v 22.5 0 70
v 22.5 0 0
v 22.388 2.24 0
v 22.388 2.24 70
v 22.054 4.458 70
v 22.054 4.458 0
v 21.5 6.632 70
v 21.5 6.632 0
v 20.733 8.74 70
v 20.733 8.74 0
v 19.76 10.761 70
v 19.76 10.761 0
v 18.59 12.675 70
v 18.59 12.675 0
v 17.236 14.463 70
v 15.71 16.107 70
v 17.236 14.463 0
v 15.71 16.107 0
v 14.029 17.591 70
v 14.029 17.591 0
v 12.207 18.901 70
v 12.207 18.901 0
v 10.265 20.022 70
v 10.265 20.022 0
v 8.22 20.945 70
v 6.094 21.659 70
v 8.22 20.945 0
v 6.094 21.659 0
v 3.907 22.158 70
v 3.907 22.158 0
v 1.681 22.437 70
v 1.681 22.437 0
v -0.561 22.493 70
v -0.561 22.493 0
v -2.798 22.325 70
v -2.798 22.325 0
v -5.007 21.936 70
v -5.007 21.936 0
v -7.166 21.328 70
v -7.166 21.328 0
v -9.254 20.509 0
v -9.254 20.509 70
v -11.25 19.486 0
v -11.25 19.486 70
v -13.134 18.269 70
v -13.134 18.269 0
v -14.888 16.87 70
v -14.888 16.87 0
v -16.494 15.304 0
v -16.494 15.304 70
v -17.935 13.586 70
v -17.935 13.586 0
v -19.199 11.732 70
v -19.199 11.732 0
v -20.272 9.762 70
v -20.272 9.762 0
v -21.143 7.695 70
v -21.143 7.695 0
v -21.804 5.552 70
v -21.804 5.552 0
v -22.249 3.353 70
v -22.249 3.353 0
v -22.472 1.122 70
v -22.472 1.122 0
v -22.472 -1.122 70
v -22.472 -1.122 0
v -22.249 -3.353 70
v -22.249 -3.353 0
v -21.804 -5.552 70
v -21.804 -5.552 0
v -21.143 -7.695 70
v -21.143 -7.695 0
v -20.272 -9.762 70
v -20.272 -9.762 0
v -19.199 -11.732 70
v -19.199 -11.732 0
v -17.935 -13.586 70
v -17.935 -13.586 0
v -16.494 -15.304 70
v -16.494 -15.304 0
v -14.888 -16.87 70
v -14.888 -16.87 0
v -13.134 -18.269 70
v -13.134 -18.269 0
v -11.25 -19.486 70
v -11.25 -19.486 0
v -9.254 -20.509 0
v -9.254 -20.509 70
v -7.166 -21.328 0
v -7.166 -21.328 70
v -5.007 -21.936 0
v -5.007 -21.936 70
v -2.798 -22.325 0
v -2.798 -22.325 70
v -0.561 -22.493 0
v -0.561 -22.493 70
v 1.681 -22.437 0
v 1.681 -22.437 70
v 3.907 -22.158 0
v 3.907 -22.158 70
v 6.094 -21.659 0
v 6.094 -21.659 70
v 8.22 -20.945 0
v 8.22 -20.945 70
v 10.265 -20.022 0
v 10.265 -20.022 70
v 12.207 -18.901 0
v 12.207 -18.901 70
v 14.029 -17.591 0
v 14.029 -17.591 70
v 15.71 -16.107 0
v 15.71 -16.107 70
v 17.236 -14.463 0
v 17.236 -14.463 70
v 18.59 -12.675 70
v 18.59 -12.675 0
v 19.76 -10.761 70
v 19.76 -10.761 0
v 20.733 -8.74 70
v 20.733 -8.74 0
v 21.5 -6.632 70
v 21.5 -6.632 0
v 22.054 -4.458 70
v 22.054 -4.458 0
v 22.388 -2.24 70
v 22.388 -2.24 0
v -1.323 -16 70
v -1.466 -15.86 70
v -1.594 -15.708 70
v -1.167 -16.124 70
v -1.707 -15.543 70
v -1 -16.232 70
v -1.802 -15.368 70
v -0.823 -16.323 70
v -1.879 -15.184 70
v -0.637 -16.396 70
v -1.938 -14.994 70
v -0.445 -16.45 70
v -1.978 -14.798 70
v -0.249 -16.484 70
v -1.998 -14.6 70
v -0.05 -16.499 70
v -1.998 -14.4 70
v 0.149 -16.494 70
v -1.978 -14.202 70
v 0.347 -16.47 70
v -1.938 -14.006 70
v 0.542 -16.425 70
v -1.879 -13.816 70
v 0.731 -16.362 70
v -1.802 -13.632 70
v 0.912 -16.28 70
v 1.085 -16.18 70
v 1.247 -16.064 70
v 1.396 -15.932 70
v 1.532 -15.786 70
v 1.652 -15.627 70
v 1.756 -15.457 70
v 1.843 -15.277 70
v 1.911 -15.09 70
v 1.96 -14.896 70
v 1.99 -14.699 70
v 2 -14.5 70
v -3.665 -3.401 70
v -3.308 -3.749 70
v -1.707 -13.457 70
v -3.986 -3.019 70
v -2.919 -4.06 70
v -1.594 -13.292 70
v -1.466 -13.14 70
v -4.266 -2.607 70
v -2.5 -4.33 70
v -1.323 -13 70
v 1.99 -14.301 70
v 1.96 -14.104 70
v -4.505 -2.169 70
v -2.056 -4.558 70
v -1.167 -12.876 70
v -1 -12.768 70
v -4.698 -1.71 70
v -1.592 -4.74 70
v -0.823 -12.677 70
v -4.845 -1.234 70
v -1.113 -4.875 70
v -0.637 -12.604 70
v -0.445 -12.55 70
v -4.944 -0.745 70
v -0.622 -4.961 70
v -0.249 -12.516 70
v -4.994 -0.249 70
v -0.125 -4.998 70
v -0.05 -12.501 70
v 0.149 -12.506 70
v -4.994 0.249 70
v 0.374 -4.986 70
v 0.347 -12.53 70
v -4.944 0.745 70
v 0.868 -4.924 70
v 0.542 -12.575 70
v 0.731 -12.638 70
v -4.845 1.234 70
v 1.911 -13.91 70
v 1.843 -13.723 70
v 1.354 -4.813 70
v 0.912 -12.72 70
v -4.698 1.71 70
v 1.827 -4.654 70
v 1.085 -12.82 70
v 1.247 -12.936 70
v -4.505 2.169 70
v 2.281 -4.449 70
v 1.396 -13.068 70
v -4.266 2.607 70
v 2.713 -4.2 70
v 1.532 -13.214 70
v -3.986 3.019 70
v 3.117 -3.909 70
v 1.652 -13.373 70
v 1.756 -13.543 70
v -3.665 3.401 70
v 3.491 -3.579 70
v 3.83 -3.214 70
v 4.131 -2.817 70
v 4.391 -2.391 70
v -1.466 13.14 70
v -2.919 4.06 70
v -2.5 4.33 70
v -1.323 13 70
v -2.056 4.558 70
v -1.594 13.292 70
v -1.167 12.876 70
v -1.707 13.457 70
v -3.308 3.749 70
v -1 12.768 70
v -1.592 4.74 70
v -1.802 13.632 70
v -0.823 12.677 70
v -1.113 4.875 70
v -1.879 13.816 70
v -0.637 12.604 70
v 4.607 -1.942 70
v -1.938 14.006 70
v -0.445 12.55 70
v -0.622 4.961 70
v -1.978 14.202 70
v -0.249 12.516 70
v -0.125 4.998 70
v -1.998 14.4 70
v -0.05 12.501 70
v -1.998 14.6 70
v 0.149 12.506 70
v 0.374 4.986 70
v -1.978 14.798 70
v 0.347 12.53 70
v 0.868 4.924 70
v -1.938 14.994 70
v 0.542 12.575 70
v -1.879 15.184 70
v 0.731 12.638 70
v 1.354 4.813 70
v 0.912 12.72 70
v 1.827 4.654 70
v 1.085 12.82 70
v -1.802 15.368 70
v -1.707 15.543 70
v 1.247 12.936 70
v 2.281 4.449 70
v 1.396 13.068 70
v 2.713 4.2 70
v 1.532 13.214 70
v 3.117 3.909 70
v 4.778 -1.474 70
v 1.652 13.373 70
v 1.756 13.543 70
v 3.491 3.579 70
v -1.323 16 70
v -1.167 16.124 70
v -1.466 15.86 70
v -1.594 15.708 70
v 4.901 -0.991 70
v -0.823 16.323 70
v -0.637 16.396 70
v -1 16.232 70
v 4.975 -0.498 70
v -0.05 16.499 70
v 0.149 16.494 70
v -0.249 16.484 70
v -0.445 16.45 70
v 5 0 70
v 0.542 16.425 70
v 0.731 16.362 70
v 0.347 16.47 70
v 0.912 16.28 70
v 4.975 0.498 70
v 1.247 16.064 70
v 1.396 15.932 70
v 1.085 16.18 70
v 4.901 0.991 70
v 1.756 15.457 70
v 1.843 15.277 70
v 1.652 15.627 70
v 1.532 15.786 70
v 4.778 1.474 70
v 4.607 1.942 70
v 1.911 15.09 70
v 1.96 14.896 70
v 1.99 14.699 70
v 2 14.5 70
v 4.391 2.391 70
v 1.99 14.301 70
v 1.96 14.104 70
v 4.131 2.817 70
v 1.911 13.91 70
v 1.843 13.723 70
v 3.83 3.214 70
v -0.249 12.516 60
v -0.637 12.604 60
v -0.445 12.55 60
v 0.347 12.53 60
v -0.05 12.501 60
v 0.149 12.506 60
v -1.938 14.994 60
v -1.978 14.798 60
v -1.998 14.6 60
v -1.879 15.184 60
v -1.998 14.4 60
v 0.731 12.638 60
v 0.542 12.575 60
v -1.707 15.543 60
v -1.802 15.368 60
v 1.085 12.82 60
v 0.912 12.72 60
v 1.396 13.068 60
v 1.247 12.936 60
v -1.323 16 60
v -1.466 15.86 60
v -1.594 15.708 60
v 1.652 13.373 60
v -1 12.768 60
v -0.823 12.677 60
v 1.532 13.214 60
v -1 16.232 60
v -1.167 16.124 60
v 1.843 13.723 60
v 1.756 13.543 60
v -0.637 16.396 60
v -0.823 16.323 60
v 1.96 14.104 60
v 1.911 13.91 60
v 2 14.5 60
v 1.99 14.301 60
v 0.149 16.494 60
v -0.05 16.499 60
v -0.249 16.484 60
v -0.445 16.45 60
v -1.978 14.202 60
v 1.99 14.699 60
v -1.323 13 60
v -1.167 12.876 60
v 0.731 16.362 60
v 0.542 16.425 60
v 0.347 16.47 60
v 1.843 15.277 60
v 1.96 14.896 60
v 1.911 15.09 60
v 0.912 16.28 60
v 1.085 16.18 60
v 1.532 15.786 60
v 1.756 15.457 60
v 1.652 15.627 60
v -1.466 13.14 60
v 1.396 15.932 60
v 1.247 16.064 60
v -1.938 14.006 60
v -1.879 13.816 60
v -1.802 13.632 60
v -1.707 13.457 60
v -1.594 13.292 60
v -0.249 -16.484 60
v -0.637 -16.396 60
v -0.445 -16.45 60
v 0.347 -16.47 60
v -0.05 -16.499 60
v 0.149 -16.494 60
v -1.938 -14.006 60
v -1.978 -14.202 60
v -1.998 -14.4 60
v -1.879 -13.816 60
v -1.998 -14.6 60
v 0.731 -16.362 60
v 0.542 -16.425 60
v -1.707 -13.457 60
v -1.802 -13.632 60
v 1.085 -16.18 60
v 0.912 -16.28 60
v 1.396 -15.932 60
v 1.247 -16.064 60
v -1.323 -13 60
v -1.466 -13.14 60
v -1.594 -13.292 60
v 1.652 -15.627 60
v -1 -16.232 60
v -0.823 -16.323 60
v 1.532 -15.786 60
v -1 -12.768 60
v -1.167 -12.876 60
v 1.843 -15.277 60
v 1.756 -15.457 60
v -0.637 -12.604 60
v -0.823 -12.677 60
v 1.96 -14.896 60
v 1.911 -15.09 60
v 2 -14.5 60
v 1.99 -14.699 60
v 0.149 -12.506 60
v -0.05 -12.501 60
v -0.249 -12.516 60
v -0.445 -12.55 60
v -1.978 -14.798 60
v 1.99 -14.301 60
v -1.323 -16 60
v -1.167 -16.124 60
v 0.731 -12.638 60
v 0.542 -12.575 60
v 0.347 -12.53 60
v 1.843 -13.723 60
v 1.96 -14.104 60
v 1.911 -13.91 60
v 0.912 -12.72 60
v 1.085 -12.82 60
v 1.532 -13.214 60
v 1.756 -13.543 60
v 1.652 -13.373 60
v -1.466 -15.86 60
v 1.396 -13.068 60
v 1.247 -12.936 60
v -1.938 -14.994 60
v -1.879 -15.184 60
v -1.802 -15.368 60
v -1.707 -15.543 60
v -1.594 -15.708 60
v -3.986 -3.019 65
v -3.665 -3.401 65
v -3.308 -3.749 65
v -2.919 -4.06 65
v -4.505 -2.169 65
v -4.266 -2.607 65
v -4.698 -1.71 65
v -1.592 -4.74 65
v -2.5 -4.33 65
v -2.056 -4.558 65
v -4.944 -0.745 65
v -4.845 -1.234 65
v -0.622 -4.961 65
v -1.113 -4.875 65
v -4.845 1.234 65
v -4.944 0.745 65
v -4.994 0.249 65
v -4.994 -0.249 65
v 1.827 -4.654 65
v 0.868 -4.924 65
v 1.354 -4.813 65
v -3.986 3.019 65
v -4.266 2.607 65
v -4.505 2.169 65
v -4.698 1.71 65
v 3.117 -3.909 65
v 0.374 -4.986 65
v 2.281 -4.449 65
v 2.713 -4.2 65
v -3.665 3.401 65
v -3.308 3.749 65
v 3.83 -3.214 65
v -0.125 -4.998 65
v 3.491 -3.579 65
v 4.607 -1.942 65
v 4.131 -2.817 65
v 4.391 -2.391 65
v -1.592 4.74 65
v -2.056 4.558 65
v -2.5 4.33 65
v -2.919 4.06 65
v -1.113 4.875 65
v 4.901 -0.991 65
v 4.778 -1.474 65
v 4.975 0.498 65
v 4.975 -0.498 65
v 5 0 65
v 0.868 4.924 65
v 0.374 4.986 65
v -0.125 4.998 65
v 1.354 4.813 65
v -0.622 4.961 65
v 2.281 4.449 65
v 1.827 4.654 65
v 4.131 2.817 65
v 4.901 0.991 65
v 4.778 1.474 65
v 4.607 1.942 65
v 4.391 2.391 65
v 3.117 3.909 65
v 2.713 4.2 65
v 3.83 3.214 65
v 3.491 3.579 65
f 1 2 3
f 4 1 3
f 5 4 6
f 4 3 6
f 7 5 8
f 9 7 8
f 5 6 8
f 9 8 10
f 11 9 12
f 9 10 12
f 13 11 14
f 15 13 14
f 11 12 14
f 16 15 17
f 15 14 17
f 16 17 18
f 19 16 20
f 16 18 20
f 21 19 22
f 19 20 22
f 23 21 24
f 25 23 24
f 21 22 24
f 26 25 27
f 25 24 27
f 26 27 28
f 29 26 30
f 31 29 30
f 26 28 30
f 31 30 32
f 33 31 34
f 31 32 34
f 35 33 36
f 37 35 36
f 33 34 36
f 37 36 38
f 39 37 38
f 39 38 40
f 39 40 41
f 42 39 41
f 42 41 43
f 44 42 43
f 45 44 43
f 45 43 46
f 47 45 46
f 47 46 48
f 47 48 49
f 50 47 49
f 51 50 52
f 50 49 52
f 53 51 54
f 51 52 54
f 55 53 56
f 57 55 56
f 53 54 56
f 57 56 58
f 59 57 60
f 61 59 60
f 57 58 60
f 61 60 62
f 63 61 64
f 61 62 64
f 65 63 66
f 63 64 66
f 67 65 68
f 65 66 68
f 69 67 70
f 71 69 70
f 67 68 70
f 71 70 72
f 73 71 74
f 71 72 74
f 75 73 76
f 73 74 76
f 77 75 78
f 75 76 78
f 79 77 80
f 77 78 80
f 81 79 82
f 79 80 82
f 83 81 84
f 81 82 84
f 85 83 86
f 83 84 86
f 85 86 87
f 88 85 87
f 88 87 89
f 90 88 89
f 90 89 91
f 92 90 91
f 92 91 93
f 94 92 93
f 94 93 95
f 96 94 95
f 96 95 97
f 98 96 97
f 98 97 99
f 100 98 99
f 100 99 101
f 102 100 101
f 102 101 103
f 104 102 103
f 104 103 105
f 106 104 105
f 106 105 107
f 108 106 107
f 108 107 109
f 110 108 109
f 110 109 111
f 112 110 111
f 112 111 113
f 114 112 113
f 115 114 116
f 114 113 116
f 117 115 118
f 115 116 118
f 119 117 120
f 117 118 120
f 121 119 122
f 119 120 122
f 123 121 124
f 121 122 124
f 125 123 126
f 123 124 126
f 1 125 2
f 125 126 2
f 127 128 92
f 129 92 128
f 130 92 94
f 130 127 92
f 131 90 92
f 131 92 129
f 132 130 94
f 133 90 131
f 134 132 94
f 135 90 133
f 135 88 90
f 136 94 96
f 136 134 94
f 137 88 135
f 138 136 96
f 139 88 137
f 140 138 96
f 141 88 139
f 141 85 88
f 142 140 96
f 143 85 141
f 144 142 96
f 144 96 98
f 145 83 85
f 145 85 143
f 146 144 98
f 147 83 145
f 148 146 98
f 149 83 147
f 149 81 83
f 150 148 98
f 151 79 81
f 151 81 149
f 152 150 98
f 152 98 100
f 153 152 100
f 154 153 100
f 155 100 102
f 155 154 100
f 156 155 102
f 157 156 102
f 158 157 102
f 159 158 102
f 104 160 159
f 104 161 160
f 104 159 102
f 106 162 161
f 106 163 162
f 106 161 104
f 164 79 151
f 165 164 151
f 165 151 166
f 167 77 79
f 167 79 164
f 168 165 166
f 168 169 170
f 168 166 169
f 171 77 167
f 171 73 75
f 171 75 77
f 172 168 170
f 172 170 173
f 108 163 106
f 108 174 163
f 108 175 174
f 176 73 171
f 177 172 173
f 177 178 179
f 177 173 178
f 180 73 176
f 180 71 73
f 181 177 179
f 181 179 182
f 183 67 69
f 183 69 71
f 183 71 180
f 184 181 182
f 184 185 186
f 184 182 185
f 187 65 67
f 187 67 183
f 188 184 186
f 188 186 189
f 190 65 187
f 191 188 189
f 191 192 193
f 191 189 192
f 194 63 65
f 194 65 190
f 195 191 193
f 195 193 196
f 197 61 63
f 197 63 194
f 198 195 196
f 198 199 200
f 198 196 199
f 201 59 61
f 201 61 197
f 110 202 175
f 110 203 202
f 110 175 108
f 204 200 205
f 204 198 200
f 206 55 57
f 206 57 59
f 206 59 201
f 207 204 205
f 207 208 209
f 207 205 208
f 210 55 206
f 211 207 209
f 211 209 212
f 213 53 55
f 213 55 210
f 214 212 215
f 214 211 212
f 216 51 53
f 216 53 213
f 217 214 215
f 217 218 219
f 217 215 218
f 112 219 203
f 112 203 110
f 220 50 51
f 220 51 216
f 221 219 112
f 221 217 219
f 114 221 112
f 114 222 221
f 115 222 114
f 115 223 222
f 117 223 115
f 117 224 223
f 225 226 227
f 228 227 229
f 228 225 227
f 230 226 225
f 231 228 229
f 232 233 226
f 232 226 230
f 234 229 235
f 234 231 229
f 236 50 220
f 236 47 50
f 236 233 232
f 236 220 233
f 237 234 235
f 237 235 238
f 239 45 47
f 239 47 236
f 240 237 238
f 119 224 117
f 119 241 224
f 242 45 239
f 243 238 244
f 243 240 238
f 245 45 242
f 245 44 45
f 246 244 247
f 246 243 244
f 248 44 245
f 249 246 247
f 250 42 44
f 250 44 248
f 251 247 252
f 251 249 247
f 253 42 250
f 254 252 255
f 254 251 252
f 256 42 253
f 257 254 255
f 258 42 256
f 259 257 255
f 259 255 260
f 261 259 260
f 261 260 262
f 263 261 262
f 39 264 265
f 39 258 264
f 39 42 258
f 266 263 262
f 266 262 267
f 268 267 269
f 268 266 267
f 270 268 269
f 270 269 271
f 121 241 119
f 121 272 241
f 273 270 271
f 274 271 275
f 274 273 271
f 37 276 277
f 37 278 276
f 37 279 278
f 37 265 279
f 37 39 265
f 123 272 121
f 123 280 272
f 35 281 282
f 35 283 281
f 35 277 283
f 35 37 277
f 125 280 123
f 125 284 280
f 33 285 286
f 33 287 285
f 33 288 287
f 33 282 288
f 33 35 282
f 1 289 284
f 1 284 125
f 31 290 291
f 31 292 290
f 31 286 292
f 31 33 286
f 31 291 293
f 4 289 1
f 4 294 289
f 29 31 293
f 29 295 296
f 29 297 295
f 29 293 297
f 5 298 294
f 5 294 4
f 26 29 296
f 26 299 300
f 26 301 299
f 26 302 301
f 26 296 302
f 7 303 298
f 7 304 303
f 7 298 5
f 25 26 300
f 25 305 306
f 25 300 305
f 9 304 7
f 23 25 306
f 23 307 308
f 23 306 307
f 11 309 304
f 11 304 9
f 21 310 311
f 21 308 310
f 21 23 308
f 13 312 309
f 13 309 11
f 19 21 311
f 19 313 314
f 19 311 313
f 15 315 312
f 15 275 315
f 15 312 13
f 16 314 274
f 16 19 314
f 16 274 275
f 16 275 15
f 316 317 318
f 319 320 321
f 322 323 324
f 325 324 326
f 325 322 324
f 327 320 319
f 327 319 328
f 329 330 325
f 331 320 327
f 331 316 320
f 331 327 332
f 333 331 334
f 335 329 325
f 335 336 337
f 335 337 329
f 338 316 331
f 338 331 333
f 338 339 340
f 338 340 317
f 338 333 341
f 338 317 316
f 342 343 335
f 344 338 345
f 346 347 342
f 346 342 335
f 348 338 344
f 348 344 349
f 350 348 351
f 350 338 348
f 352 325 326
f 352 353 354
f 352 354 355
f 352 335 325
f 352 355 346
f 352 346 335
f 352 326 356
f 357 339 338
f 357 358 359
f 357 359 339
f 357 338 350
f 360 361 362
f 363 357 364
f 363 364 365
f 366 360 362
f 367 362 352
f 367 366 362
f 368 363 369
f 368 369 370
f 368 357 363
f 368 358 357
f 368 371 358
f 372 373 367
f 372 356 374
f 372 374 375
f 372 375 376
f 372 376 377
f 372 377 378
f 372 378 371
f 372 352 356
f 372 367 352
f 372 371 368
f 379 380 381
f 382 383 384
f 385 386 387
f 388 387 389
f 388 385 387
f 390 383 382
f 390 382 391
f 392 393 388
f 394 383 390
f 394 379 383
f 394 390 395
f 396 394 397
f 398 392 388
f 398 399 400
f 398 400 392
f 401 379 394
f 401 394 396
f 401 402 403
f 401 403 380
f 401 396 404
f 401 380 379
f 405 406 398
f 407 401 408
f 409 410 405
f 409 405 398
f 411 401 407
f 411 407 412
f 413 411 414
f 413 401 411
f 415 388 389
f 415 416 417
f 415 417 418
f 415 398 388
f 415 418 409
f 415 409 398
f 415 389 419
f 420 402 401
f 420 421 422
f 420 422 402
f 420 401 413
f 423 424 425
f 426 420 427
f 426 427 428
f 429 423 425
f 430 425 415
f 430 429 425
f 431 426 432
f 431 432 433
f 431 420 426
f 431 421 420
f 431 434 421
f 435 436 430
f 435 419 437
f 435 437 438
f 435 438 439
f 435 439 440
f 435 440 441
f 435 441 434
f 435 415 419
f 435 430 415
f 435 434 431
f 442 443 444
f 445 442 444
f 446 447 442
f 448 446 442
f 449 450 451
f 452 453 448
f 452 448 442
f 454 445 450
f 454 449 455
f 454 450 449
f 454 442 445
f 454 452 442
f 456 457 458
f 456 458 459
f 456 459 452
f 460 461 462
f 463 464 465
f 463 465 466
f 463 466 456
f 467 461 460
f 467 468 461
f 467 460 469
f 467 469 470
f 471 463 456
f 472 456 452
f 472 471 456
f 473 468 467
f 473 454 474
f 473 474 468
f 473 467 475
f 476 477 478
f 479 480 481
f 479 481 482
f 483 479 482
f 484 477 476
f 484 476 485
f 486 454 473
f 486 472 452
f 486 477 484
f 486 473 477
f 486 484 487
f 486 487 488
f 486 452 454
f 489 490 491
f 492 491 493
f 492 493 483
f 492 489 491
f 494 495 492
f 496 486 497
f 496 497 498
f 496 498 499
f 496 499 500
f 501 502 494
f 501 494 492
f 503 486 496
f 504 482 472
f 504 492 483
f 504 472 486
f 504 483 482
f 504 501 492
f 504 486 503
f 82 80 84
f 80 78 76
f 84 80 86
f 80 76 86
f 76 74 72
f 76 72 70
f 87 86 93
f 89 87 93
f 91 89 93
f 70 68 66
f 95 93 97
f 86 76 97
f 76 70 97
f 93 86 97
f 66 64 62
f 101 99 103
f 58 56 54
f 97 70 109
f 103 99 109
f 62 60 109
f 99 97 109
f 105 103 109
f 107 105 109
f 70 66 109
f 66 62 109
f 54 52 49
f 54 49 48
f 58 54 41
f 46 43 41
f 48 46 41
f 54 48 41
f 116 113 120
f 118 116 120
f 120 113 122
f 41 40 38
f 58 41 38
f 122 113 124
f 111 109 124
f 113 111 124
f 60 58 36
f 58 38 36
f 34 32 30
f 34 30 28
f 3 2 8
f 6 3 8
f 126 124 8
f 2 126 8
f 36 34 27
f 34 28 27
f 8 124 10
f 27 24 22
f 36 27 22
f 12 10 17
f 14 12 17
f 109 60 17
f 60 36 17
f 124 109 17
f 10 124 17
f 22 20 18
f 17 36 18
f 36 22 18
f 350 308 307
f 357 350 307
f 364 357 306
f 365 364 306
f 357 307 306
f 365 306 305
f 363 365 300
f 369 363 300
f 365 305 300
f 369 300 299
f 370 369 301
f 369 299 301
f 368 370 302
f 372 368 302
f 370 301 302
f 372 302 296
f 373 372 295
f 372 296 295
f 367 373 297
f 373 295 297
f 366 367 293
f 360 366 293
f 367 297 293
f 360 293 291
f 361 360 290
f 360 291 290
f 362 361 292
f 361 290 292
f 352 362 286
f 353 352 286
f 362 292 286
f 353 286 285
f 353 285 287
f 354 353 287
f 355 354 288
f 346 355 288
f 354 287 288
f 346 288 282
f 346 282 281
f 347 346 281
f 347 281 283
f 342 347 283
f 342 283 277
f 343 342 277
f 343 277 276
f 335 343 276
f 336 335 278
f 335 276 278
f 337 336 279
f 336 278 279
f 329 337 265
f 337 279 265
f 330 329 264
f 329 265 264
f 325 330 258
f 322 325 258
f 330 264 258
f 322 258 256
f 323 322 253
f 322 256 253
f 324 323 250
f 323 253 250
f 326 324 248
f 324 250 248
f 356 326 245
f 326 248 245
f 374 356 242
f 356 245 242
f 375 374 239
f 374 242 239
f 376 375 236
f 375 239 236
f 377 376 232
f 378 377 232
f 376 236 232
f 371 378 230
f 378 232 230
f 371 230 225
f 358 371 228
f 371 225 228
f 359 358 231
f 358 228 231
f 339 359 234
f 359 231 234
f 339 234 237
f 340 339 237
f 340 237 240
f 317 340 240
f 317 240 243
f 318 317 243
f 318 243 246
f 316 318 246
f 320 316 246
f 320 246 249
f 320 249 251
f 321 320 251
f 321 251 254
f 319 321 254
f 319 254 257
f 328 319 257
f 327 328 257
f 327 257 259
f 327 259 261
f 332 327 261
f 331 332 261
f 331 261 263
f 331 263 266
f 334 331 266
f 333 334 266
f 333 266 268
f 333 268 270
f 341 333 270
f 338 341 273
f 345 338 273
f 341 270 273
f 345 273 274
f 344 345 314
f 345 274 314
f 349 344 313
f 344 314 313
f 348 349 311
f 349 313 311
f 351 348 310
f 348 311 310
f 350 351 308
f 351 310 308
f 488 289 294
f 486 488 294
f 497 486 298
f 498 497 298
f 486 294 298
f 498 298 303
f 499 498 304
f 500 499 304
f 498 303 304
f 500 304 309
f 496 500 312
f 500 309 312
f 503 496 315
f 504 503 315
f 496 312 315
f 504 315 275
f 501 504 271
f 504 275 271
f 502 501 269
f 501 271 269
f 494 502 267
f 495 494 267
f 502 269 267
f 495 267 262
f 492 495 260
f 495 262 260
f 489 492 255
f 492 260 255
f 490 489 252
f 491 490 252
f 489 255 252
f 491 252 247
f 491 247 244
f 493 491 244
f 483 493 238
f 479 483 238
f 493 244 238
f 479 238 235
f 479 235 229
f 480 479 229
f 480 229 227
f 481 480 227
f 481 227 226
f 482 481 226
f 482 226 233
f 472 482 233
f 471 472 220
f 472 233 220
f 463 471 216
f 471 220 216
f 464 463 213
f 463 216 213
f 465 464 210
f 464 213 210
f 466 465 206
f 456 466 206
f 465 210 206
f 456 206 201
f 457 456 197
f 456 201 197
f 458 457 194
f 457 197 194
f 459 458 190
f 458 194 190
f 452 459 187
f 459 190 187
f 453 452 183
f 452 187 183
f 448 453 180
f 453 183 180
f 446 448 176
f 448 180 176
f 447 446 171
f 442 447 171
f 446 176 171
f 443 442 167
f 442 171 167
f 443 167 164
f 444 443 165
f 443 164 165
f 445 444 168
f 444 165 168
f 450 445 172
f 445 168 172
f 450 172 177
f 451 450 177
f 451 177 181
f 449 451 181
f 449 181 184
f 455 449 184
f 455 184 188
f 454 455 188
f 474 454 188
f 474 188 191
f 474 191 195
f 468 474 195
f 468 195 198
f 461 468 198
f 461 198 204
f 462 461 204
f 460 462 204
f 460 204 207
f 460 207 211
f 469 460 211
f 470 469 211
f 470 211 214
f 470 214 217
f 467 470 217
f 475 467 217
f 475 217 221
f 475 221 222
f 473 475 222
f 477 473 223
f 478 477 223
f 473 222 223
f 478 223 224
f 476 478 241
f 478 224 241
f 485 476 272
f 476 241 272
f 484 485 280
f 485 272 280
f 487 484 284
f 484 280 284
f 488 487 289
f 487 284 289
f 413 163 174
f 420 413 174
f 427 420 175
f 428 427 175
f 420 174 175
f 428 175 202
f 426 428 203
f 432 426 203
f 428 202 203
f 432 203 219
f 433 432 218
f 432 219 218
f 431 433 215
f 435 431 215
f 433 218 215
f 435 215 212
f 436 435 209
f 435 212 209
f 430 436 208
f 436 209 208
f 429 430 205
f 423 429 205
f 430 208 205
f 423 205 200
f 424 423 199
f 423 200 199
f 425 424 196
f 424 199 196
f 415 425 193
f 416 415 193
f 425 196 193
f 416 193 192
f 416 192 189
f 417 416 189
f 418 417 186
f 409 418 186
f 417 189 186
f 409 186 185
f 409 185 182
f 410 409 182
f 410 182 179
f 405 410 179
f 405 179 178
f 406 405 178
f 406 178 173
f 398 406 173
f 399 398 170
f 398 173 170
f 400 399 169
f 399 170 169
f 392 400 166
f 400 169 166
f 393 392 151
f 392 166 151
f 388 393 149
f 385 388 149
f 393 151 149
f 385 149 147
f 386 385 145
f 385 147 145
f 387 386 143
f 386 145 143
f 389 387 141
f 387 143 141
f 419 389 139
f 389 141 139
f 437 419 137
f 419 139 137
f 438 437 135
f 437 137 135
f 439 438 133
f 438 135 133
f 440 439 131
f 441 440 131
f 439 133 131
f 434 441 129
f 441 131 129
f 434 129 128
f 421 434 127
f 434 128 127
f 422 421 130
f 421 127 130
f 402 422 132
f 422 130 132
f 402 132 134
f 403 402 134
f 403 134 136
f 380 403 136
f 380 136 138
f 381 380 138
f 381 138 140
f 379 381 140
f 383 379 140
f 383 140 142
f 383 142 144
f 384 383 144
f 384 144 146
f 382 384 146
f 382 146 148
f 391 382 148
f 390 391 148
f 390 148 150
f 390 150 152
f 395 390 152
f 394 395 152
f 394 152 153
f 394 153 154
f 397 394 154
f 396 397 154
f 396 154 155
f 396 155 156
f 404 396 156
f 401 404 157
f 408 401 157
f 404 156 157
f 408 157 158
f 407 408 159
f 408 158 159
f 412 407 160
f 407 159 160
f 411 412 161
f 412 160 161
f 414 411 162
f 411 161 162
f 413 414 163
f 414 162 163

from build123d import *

# Parameters (mm, degrees)
SKETCH_1_R          = 22.5
EXTRUDE_1_DEPTH     = 70
SKETCH_2_R          = 2
CUT_EXTRUDE_1_DEPTH = 10
SKETCH_5_R          = 5
CUT_EXTRUDE_2_DEPTH = 5


with BuildPart() as part:
    # 草图1 → 凸台-拉伸1 (new body)
    with BuildSketch(Plane.XY):
        Circle(SKETCH_1_R)
    extrude(amount=EXTRUDE_1_DEPTH)

    # 草图2 → 切除-拉伸1 (cut)
    with BuildSketch(Plane.XY.offset(70)):
        with Locations((0, 14.5)):
            Circle(SKETCH_2_R)
        with Locations((0, -14.5)):
            Circle(SKETCH_2_R)
    extrude(amount=-CUT_EXTRUDE_1_DEPTH, mode=Mode.SUBTRACT)

    # 草图5 → 切除-拉伸2 (cut)
    with BuildSketch(Plane.XY.offset(70)):
        Circle(SKETCH_5_R)
    extrude(amount=-CUT_EXTRUDE_2_DEPTH, mode=Mode.SUBTRACT)


solid = part.part
